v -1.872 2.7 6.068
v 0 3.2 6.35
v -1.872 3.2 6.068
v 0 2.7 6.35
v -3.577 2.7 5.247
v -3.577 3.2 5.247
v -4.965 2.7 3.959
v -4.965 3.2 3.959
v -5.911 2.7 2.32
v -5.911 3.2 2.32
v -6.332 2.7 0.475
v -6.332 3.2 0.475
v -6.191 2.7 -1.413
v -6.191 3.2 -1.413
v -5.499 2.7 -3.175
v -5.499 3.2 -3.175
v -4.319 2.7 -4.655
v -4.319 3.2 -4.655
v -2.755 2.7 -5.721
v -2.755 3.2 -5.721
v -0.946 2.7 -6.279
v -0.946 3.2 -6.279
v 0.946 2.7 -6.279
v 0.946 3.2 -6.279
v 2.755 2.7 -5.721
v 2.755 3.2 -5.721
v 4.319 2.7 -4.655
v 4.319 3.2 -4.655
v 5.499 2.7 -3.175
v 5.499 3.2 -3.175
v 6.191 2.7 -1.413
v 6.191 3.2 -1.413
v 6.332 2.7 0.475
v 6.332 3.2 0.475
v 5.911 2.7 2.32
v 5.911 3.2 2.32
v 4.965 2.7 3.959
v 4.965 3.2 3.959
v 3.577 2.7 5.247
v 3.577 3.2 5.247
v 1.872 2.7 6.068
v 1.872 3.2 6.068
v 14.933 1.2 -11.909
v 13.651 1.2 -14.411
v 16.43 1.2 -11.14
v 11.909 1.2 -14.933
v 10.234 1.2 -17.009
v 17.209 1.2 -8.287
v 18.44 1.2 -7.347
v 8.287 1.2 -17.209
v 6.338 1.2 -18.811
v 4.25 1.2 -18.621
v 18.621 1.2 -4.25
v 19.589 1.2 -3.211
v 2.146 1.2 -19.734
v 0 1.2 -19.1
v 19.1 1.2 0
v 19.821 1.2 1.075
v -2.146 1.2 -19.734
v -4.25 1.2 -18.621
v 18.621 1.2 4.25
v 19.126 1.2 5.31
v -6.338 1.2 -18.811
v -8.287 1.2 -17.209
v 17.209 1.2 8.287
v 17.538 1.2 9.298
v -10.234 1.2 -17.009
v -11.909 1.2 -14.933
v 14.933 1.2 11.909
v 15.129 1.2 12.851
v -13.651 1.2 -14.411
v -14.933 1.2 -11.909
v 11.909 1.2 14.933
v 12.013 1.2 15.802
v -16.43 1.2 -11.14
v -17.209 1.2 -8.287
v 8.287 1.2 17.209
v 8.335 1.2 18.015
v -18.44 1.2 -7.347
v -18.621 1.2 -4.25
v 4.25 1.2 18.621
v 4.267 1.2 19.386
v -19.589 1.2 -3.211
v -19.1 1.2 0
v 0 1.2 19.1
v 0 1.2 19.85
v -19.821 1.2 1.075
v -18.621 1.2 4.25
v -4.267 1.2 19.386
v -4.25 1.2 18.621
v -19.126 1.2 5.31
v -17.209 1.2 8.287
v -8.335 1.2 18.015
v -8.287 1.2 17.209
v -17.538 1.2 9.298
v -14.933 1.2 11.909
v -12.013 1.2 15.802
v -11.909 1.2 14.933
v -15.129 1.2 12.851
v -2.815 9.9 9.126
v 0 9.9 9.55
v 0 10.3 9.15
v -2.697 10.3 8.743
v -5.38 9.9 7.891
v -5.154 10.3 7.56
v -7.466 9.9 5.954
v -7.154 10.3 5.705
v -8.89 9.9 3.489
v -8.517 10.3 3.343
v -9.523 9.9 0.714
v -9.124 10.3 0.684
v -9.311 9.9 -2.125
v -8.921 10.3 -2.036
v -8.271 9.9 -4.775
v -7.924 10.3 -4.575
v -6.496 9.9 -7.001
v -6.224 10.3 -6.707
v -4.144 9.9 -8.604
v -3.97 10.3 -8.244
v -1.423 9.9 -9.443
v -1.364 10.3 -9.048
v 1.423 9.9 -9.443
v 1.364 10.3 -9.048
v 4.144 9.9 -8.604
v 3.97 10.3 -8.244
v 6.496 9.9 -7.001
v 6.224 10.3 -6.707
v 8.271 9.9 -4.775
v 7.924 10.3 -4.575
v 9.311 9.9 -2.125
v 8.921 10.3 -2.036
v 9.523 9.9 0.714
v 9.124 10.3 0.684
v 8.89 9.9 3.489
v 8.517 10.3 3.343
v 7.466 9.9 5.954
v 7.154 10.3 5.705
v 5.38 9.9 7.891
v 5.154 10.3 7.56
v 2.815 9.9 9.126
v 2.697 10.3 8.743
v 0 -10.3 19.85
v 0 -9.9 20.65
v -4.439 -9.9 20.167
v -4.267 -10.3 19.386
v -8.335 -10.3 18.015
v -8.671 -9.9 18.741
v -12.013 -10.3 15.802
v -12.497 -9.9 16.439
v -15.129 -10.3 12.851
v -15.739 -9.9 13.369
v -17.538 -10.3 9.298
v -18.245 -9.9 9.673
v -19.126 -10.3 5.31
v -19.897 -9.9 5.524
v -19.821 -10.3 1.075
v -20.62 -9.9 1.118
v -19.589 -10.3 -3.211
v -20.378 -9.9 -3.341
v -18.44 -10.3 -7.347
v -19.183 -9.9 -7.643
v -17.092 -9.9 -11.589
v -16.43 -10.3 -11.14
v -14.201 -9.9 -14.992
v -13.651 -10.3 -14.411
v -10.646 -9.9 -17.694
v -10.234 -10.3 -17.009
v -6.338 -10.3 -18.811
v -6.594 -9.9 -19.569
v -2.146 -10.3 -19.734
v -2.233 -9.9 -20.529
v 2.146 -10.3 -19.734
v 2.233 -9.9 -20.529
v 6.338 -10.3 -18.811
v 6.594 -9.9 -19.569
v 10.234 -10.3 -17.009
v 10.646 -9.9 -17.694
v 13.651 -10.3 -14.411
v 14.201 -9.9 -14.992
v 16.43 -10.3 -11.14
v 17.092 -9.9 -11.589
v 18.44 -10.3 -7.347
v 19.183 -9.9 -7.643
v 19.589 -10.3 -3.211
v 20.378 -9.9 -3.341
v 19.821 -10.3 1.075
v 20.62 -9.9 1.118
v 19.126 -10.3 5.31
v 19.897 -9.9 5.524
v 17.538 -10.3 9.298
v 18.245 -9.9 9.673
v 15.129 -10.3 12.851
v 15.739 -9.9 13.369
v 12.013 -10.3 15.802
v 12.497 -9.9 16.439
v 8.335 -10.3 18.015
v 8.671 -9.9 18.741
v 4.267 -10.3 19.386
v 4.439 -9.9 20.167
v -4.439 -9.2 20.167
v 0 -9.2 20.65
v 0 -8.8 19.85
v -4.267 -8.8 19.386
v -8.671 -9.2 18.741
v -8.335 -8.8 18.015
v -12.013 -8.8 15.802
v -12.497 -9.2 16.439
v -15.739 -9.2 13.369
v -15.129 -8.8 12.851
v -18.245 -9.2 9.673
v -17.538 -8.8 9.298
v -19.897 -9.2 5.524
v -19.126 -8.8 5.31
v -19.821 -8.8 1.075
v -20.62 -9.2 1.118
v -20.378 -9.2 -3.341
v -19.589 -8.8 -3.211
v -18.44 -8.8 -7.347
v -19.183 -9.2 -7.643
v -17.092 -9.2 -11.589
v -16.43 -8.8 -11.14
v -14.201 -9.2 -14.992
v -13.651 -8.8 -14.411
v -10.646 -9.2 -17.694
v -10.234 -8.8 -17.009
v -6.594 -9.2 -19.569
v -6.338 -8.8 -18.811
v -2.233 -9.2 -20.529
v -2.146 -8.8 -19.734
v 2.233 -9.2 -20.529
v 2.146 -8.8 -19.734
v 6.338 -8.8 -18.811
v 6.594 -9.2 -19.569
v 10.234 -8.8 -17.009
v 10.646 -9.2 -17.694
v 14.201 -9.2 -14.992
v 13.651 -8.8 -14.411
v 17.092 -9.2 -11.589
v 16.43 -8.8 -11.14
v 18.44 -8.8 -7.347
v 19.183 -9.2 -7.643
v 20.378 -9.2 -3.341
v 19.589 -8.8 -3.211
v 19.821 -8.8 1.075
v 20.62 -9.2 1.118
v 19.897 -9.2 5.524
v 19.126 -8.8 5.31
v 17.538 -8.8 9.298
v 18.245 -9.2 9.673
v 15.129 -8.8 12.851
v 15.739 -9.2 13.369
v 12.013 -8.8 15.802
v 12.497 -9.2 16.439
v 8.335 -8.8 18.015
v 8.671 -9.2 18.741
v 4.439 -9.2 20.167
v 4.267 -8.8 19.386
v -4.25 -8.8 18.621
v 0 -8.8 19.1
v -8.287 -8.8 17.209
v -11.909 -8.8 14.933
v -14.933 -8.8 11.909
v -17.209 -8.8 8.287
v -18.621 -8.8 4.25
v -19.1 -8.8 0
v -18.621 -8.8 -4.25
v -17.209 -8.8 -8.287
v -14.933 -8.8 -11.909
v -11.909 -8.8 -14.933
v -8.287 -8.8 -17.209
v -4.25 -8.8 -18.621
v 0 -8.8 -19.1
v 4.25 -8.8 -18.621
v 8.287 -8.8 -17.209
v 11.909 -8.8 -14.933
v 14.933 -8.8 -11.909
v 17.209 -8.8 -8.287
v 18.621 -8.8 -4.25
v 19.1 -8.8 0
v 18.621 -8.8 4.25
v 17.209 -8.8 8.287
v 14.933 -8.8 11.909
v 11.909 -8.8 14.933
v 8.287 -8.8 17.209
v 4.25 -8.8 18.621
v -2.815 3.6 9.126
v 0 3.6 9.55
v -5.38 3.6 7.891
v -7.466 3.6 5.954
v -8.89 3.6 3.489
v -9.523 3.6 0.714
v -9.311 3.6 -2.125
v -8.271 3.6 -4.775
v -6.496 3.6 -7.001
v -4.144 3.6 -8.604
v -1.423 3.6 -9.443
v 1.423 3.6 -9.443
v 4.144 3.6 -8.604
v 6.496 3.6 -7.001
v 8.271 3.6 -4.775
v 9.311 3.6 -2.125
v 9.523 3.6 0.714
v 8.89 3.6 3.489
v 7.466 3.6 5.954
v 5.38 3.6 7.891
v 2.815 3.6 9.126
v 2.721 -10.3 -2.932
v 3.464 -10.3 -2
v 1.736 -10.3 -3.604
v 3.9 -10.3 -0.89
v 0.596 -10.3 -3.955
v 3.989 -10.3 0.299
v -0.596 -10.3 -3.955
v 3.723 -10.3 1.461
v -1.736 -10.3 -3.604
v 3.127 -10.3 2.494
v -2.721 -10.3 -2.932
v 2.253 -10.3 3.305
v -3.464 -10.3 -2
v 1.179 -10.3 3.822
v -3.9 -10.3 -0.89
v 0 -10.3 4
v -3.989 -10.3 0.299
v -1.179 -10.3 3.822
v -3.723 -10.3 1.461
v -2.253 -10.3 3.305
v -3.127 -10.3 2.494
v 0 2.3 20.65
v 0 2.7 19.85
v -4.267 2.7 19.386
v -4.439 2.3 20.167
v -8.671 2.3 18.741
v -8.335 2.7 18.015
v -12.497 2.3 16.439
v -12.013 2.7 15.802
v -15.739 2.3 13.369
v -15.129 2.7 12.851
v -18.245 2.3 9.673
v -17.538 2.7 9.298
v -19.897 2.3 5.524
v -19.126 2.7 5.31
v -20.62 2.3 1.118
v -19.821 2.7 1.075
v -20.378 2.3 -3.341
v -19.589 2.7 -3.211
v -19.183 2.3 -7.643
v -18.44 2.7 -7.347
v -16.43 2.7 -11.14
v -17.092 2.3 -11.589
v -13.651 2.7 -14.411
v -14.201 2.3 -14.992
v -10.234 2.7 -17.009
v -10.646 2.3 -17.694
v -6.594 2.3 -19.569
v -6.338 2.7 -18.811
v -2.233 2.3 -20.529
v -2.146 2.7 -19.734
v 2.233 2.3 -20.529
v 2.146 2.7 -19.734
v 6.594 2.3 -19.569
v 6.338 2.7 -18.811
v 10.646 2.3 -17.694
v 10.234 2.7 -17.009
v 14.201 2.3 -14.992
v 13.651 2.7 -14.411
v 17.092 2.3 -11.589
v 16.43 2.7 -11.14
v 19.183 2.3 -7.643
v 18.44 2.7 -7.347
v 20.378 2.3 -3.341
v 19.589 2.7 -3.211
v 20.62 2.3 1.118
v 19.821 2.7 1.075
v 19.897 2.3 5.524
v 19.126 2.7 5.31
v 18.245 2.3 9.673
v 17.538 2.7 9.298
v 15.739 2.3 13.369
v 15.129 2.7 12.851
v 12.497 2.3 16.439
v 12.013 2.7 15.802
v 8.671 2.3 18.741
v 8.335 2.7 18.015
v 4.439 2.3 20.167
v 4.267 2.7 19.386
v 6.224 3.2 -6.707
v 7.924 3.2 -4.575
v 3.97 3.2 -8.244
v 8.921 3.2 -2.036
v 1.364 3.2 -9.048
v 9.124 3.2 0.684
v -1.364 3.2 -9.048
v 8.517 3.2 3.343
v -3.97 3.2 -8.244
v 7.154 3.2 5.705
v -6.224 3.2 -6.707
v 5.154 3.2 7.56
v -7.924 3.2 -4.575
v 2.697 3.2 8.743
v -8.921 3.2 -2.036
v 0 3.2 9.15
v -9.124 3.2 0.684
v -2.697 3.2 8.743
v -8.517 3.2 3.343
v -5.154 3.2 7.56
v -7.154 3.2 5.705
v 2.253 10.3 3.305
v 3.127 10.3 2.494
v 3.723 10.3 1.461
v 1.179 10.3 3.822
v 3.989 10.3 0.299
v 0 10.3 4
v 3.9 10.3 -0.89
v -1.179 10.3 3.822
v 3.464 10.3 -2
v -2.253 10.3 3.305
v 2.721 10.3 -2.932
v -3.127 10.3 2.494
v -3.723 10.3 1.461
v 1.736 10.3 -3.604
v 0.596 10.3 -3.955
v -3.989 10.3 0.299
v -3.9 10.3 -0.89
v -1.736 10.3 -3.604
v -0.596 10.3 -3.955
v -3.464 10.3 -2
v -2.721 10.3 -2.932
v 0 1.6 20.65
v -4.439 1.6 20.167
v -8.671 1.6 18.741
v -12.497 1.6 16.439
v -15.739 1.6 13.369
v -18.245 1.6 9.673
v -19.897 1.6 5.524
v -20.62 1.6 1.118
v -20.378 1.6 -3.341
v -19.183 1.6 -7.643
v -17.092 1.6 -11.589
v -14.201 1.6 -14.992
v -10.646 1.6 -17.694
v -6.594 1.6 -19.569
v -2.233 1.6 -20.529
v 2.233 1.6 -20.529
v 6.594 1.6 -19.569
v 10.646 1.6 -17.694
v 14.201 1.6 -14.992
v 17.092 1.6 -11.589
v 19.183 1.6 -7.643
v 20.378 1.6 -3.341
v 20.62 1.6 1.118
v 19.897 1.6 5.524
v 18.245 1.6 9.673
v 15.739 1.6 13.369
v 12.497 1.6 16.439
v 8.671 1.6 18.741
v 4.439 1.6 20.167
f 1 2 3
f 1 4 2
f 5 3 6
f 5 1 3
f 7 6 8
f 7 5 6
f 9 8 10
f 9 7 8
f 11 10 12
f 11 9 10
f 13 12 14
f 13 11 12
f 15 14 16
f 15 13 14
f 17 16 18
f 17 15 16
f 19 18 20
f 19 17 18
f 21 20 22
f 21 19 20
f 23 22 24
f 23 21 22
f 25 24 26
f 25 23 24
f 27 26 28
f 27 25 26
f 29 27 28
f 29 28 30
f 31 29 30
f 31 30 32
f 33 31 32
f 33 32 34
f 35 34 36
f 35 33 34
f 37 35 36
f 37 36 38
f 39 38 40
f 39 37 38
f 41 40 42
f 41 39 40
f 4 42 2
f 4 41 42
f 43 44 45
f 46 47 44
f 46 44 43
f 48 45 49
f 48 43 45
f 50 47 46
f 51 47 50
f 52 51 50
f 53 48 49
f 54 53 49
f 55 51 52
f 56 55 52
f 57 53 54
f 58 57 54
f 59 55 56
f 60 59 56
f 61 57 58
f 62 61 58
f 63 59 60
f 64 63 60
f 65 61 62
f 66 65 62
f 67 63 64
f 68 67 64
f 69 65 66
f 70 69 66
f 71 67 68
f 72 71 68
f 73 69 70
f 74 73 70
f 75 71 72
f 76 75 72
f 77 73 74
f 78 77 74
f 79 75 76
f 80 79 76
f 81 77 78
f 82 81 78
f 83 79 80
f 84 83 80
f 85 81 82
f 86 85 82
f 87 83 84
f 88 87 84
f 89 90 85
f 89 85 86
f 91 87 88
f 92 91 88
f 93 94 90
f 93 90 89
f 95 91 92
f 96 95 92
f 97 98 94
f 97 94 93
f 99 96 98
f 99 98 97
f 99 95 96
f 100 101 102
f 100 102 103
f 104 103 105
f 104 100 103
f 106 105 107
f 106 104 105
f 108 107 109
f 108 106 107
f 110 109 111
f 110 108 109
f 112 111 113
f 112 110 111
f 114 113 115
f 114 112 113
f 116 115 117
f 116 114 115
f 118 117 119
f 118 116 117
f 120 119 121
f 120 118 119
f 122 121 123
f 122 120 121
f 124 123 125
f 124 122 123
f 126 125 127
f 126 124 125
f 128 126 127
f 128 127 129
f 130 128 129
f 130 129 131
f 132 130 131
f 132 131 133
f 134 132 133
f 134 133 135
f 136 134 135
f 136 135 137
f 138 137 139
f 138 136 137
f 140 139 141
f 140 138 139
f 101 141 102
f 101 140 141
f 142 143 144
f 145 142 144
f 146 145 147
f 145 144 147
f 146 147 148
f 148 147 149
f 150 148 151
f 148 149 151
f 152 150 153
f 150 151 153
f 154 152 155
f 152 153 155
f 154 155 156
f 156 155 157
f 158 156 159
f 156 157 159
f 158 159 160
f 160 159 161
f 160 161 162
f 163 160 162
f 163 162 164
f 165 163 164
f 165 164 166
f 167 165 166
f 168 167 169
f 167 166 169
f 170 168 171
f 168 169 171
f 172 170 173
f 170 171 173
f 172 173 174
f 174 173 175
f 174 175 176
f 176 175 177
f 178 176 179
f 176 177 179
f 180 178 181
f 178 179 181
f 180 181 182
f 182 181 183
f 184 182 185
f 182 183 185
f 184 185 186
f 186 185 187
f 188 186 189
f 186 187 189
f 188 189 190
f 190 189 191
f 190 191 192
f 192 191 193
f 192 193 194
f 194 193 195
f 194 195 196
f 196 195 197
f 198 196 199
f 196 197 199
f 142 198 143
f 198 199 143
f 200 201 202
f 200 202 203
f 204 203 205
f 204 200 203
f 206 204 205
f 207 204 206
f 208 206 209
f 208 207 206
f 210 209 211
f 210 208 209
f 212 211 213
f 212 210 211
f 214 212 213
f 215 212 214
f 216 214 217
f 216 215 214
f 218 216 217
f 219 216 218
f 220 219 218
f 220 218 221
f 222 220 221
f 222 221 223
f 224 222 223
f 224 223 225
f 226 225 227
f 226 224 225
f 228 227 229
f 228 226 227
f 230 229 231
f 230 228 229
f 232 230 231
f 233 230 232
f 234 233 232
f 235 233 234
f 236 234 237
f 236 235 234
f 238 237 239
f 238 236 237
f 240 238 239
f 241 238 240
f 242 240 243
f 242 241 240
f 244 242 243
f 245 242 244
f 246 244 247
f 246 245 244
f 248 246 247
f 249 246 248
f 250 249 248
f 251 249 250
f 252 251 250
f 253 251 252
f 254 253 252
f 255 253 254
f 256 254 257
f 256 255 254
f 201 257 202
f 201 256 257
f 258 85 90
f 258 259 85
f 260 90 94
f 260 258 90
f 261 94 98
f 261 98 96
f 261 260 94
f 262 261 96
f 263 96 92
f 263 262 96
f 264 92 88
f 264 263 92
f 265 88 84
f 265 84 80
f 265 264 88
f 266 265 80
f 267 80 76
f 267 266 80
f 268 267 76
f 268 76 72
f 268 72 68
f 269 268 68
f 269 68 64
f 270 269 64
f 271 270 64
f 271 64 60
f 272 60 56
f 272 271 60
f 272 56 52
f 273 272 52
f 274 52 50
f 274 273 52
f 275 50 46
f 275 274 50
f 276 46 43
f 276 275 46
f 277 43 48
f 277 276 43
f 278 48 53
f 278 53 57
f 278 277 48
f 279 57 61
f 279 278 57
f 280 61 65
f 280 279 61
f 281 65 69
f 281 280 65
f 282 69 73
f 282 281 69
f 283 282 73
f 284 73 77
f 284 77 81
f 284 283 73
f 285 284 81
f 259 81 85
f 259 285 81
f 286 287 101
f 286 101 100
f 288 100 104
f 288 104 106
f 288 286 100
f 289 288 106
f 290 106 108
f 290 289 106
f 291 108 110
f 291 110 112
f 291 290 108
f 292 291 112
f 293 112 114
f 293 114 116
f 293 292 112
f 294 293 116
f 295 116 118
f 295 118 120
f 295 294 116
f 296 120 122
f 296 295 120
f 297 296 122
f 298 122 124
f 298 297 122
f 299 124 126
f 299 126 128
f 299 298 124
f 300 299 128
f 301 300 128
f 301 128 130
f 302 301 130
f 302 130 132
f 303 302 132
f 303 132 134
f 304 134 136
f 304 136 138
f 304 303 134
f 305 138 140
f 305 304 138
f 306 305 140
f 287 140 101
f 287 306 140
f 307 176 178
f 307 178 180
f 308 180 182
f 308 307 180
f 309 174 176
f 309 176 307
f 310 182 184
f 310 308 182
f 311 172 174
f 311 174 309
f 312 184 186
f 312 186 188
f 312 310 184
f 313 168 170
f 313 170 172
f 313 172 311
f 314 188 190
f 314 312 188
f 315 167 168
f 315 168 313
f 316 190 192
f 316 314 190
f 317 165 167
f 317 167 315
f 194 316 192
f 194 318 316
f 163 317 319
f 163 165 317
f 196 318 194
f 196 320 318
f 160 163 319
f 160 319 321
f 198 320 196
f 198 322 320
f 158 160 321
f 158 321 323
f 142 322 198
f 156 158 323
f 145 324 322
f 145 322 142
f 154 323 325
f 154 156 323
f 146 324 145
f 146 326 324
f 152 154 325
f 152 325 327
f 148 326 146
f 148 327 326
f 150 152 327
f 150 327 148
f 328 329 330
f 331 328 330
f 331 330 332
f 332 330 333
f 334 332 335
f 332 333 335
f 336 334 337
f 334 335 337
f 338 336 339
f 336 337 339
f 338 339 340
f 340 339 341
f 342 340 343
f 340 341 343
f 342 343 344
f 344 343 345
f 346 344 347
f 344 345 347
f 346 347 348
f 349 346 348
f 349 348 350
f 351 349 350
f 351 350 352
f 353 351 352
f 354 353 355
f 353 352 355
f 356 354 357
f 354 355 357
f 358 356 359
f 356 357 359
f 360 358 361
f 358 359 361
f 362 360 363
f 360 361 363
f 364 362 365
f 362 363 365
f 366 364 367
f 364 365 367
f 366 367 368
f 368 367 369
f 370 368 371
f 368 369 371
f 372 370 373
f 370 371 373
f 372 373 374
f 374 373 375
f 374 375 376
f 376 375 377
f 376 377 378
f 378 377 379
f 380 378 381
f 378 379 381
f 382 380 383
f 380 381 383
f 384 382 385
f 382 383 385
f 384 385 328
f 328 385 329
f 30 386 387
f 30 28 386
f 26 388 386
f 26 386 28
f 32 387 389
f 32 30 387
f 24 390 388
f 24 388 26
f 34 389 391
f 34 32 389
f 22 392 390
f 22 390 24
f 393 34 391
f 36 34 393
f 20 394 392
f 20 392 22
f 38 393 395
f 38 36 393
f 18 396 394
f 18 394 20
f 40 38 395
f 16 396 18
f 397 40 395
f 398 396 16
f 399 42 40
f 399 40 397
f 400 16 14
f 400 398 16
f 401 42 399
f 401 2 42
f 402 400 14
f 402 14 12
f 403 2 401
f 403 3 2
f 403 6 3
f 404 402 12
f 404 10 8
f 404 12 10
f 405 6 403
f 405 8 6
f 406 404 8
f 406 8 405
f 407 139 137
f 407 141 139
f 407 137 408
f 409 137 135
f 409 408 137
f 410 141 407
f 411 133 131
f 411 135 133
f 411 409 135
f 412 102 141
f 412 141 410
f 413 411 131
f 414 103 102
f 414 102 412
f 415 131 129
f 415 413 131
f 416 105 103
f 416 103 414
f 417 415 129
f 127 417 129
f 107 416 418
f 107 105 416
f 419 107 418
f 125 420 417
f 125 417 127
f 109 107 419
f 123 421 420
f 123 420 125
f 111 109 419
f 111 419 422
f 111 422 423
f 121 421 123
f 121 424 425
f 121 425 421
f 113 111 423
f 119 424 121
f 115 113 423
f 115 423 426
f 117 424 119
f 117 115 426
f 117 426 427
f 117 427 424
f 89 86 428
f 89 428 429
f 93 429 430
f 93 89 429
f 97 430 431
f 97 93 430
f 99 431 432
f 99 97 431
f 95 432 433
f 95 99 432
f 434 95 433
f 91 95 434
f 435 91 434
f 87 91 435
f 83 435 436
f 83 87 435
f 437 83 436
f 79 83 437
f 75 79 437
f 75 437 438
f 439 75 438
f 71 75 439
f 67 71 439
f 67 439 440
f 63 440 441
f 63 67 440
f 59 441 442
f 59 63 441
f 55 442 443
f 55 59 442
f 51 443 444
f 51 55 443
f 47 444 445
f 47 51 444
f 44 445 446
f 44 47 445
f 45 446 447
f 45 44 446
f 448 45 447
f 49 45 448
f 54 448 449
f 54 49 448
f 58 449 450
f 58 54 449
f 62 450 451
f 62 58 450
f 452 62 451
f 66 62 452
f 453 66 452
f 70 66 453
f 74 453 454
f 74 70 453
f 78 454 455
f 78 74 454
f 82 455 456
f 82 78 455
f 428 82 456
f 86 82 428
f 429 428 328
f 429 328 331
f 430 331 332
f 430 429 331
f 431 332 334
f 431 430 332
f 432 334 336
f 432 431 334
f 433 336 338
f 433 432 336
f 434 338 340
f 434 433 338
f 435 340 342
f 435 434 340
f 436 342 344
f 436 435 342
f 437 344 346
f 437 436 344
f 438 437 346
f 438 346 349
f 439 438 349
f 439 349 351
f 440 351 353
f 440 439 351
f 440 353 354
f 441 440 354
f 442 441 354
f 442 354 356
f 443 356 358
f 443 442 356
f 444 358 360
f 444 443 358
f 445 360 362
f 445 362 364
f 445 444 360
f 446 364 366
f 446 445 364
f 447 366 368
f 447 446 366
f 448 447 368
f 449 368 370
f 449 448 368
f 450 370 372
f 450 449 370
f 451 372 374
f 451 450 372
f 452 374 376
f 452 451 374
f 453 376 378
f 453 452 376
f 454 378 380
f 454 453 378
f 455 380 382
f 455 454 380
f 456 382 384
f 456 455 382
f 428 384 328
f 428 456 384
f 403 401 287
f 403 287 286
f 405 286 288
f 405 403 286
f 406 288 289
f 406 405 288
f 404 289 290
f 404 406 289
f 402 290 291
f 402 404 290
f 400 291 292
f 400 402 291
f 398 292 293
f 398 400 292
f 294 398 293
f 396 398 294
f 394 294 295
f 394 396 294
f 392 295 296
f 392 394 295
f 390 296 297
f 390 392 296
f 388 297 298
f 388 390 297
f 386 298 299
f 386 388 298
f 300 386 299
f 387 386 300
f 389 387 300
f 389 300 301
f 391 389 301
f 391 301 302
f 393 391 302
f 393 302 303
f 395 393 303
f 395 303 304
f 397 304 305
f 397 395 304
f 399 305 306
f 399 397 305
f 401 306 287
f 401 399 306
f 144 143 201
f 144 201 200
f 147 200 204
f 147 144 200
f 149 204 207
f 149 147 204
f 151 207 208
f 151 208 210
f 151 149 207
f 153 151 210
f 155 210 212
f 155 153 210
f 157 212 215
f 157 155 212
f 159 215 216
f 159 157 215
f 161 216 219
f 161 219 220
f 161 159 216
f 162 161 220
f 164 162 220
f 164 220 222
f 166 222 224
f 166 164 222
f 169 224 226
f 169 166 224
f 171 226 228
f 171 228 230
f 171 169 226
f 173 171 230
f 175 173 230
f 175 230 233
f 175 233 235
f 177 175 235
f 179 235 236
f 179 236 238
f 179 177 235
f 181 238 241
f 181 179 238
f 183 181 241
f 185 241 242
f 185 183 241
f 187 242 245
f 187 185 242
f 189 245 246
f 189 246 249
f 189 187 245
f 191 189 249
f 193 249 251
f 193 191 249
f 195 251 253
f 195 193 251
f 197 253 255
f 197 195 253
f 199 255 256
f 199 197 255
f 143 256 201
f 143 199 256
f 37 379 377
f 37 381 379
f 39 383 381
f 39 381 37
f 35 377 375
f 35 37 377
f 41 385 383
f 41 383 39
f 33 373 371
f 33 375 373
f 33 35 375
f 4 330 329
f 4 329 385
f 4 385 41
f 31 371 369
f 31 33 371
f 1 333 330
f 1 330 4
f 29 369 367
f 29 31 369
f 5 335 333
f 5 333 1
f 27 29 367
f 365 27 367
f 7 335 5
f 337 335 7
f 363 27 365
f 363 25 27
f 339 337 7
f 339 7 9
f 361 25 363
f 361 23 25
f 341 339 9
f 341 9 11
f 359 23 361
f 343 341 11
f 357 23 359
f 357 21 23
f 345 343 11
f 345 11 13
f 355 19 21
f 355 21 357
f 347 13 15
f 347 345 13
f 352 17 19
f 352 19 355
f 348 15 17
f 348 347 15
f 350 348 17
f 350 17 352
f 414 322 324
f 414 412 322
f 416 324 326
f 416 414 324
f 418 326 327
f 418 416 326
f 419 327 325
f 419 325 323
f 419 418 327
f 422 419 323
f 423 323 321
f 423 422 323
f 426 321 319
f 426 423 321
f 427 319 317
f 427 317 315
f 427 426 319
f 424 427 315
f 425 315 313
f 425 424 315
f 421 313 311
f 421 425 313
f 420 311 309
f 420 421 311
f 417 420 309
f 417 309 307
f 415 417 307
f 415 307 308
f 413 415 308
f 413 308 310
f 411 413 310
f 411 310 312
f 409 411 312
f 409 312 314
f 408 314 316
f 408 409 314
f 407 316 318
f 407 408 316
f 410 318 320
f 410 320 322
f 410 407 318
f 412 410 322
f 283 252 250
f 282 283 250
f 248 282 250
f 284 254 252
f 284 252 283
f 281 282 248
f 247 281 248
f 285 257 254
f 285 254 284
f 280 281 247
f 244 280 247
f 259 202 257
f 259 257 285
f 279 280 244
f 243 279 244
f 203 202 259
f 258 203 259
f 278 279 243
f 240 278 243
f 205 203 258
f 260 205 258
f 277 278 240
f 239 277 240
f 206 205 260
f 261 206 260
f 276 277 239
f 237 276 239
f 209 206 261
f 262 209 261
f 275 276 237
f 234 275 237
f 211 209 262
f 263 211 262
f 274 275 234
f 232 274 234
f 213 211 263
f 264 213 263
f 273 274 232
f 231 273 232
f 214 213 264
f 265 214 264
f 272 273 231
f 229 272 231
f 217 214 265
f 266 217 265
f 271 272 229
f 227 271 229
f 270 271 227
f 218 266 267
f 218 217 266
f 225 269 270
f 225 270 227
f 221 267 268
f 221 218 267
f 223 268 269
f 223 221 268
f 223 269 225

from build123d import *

# Parameters (mm, degrees)
F2_C1_SIZE2 = 0.4
F2_C1_SIZE  = 0.8
F2_C2_SIZE2 = 0.8
F2_C2_SIZE  = 0.4
F2_C3_SIZE2 = 0.8
F2_C3_SIZE  = 0.4
F3_SIZE2    = 0.4
F3_SIZE     = 0.8
F4_SIZE     = 0.4


with BuildPart() as f1:
    # F0 (on Right) → F1 (revolve)
    with BuildSketch(Plane.YZ):
        Polygon((-10.3, 20.65), (-10.3, 4), (10.3, 4), (10.3, 9.55), (3.2, 9.55), (3.2, 6.35), (2.7, 6.35), (2.7, 20.65), (1.2, 20.65), (1.2, 19.1), (-8.8, 19.1), (-8.8, 20.65), align=None)
    revolve(axis=Axis((0, -3.1587743408, 0), (0, -1, 0)))

    # F2: chamfer of 0.4 x 0.8 on 3 edges, made by hand

    # F2_c1
    f2_c1_edges = [f1.edges().sort_by_distance(p)[0] for p in [
        (0, -10.3, -20.65),
    ]]
    f2_c1_side = f1.faces().sort_by_distance((0, -10.3, -20.642))[0]
    chamfer(f2_c1_edges, length=F2_C1_SIZE, length2=F2_C1_SIZE2, reference=f2_c1_side)

    # F2_c2
    f2_c2_edges = [f1.edges().sort_by_distance(p)[0] for p in [
        (0, 2.7, -20.65),
    ]]
    f2_c2_side = f1.faces().sort_by_distance((0, 2.692, -20.65))[0]
    chamfer(f2_c2_edges, length=F2_C2_SIZE, length2=F2_C2_SIZE2, reference=f2_c2_side)

    # F2_c3
    f2_c3_edges = [f1.edges().sort_by_distance(p)[0] for p in [
        (0, 1.2, -20.65),
    ]]
    f2_c3_side = f1.faces().sort_by_distance((0, 1.208, -20.65))[0]
    chamfer(f2_c3_edges, length=F2_C3_SIZE, length2=F2_C3_SIZE2, reference=f2_c3_side)

    # F3
    f3_edges = [f1.edges().sort_by_distance(p)[0] for p in [
        (0, -8.8, -20.65),
    ]]
    chamfer(f3_edges, length=F3_SIZE, length2=F3_SIZE2)

    # F4
    f4_edges = [f1.edges().sort_by_distance(p)[0] for p in [
        (0, 3.2, -9.55),
        (0, 10.3, -9.55),
    ]]
    chamfer(f4_edges, length=F4_SIZE)


solid = f1.part
